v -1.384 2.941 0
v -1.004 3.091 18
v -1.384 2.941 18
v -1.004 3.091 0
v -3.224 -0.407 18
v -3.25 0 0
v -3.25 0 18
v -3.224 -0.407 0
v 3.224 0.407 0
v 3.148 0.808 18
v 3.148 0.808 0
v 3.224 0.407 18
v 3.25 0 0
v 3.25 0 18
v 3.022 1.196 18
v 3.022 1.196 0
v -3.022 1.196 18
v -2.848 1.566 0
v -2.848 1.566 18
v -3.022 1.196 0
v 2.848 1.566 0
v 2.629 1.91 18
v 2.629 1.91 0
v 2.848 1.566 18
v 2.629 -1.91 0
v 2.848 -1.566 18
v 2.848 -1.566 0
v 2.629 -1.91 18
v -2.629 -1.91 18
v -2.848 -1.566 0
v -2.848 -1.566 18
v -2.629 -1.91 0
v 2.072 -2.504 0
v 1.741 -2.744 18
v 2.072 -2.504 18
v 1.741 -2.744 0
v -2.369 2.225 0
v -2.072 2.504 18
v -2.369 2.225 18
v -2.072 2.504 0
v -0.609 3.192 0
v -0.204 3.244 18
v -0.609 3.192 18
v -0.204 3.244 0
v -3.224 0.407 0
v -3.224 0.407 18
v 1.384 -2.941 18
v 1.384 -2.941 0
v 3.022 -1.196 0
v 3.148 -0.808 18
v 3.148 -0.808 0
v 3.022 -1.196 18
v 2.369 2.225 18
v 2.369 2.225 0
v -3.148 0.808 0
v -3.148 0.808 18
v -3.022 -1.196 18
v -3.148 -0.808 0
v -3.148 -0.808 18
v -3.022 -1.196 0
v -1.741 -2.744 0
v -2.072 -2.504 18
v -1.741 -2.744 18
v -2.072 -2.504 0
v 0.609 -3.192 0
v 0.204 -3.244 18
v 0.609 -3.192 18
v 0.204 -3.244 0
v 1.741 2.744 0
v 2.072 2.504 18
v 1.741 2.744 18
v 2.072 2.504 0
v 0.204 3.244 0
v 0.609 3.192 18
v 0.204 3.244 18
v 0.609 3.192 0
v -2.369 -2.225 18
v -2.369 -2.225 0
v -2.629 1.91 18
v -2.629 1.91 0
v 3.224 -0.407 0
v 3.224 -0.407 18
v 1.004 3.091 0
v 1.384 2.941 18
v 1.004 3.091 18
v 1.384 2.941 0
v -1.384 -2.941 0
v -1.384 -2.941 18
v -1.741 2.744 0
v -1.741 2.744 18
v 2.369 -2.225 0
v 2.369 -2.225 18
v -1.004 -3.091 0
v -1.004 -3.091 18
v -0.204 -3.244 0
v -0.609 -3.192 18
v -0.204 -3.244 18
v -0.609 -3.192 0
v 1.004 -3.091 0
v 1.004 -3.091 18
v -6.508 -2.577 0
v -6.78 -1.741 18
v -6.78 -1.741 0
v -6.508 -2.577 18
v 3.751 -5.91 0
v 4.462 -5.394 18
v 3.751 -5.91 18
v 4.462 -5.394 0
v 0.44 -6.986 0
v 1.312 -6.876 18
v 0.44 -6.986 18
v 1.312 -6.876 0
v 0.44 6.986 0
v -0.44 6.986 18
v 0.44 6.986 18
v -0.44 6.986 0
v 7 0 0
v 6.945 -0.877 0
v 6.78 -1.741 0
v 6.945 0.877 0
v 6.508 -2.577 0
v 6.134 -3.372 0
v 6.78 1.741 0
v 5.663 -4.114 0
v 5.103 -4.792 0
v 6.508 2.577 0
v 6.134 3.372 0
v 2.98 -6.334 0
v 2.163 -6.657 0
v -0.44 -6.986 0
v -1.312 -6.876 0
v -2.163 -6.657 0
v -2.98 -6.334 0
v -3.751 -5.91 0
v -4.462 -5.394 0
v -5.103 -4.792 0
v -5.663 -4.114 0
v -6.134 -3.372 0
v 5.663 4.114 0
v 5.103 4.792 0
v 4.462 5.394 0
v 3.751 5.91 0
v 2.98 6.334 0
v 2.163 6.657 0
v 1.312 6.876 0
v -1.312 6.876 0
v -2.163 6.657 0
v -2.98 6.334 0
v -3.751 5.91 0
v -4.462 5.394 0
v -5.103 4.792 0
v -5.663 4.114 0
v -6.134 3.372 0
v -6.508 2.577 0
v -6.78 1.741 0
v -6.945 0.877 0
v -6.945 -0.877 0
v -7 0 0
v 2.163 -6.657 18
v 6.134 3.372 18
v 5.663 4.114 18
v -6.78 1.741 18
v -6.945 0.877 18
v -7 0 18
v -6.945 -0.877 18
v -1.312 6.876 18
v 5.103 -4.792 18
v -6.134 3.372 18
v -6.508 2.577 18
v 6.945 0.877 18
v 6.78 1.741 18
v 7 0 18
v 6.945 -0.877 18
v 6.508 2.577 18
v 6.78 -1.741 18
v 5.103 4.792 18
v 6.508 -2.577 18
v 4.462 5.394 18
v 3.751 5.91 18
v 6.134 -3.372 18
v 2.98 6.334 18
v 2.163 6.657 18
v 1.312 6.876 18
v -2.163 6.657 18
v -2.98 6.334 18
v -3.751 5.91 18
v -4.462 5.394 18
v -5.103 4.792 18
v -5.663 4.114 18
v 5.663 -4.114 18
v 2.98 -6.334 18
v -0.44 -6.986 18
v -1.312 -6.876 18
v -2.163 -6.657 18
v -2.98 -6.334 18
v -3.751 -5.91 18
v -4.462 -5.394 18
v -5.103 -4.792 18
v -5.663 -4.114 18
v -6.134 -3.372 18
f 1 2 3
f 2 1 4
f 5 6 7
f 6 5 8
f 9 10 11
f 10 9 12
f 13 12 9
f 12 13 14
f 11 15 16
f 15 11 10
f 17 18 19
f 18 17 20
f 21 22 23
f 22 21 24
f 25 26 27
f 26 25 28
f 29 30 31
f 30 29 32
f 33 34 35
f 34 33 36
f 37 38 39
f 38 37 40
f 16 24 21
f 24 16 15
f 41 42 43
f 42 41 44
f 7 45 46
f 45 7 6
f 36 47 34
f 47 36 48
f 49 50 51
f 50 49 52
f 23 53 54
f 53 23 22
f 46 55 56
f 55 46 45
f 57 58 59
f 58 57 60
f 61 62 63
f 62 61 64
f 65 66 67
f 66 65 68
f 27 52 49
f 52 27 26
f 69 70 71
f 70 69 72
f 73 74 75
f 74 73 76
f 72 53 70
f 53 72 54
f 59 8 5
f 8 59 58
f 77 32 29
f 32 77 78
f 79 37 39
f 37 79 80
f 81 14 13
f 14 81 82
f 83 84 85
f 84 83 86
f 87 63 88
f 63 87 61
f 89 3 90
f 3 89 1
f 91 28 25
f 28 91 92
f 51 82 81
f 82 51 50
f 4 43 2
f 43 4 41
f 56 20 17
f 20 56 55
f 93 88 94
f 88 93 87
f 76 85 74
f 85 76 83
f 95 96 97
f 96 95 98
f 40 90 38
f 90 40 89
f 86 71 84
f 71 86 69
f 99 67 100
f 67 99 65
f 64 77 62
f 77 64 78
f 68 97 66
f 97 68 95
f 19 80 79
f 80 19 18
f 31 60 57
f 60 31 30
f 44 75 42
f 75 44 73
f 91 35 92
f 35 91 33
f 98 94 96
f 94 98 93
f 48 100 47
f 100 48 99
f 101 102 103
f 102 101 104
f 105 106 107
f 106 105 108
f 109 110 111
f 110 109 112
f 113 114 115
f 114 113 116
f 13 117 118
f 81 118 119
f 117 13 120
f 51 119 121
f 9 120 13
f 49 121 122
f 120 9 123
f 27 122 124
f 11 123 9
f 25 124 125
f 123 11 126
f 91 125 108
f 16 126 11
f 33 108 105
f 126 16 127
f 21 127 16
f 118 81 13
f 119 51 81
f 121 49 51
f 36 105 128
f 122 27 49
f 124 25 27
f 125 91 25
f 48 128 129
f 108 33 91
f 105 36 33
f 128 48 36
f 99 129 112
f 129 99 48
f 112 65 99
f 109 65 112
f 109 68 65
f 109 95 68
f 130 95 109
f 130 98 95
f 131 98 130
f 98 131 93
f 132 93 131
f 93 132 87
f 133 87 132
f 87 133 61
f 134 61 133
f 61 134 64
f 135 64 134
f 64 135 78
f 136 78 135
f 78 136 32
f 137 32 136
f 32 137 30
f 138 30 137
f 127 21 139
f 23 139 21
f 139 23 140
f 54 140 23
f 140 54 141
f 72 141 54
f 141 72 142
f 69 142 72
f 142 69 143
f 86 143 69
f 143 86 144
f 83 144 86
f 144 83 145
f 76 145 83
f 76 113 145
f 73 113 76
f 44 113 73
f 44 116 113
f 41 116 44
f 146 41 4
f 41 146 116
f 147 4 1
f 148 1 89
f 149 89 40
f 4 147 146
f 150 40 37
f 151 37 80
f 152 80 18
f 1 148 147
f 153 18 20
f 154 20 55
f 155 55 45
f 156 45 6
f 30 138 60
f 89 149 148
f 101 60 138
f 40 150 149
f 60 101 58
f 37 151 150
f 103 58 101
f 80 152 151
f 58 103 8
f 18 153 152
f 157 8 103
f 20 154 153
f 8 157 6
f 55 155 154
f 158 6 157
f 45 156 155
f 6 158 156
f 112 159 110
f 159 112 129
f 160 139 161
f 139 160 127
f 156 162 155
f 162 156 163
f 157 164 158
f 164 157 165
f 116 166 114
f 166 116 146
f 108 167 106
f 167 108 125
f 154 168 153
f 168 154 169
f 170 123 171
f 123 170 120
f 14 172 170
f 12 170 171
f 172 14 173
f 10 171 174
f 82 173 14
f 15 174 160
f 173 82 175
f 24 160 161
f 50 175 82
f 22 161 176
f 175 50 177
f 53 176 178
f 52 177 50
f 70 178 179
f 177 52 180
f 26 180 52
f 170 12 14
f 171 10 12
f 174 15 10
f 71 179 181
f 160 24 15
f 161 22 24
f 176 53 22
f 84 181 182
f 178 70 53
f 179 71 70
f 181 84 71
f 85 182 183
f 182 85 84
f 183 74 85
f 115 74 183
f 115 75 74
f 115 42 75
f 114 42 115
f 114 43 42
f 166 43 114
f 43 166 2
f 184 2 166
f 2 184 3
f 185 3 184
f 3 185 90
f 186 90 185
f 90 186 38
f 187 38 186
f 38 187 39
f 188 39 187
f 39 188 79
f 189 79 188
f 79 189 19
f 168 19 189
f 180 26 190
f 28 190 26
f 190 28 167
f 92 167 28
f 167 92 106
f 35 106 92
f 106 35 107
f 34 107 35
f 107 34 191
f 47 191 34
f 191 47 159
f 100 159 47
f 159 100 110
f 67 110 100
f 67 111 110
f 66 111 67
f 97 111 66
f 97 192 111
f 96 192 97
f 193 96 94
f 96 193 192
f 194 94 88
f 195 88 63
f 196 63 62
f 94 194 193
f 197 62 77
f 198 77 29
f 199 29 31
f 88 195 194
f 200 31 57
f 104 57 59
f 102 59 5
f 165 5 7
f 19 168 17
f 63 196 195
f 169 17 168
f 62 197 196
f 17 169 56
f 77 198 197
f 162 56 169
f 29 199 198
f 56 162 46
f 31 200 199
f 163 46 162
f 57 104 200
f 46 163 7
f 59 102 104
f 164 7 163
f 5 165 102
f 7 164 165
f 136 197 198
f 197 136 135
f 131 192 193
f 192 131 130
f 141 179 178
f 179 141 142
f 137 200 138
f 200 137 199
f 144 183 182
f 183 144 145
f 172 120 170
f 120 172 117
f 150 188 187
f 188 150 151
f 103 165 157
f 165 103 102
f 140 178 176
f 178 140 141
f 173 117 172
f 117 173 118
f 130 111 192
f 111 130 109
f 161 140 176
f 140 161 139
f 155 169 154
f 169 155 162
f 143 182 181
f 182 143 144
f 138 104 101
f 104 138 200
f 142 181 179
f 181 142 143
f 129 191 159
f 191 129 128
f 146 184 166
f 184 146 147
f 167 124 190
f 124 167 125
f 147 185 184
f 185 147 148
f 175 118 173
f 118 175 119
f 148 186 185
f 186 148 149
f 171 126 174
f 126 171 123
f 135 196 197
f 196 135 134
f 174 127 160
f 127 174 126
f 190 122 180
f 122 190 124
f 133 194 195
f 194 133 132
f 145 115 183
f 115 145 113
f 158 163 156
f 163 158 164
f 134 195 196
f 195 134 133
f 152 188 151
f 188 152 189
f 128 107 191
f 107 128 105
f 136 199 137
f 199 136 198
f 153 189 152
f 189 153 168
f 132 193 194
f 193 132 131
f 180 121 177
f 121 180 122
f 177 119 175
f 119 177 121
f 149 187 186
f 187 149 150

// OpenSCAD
$fn = 50;


difference() {
	union() {
		*color(alpha = 1.0000000000, c = "gray") {
			translate(v = [0, 7, 0]) {
				linear_extrude(height = 1) {
					text(font = "Arial:style=Bold", halign = "center", size = 4.5000000000, text = "COMMENT plate main", valign = "center");
				}
			}
		}
		*color(alpha = 1.0000000000, c = "gray") {
			translate(v = [0, 14, 0]) {
				linear_extrude(height = 1) {
					text(font = "Arial:style=Bold", halign = "center", size = 4.5000000000, text = "COMMENT description oobb_plate_shape_p_type_18_depth_1_width_1_height_18_thickness_true_both_holes", valign = "center");
				}
			}
		}
		cylinder(h = 18, r = 7.0000000000);
	}
	union() {
		*color(alpha = 1.0000000000, c = "gray") {
			translate(v = [0, 7, 0]) {
				linear_extrude(height = 1) {
					text(font = "Arial:style=Bold", halign = "center", size = 4.5000000000, text = "COMMENT holes main", valign = "center");
				}
			}
		}
		*color(alpha = 1.0000000000, c = "gray") {
			translate(v = [0, 14, 0]) {
				linear_extrude(height = 1) {
					text(font = "Arial:style=Bold", halign = "center", size = 4.5000000000, text = "COMMENT description oobb_holes_shape_n_type_1_width_1_height_18_thickness_true_both_holes", valign = "center");
				}
			}
		}
		translate(v = [0, 0, -50]) {
			cylinder(h = 100, r = 3.2500000000);
		}
		translate(v = [0, 0, -50]) {
			cylinder(h = 100, r = 1.8000000000);
		}
	}
}
